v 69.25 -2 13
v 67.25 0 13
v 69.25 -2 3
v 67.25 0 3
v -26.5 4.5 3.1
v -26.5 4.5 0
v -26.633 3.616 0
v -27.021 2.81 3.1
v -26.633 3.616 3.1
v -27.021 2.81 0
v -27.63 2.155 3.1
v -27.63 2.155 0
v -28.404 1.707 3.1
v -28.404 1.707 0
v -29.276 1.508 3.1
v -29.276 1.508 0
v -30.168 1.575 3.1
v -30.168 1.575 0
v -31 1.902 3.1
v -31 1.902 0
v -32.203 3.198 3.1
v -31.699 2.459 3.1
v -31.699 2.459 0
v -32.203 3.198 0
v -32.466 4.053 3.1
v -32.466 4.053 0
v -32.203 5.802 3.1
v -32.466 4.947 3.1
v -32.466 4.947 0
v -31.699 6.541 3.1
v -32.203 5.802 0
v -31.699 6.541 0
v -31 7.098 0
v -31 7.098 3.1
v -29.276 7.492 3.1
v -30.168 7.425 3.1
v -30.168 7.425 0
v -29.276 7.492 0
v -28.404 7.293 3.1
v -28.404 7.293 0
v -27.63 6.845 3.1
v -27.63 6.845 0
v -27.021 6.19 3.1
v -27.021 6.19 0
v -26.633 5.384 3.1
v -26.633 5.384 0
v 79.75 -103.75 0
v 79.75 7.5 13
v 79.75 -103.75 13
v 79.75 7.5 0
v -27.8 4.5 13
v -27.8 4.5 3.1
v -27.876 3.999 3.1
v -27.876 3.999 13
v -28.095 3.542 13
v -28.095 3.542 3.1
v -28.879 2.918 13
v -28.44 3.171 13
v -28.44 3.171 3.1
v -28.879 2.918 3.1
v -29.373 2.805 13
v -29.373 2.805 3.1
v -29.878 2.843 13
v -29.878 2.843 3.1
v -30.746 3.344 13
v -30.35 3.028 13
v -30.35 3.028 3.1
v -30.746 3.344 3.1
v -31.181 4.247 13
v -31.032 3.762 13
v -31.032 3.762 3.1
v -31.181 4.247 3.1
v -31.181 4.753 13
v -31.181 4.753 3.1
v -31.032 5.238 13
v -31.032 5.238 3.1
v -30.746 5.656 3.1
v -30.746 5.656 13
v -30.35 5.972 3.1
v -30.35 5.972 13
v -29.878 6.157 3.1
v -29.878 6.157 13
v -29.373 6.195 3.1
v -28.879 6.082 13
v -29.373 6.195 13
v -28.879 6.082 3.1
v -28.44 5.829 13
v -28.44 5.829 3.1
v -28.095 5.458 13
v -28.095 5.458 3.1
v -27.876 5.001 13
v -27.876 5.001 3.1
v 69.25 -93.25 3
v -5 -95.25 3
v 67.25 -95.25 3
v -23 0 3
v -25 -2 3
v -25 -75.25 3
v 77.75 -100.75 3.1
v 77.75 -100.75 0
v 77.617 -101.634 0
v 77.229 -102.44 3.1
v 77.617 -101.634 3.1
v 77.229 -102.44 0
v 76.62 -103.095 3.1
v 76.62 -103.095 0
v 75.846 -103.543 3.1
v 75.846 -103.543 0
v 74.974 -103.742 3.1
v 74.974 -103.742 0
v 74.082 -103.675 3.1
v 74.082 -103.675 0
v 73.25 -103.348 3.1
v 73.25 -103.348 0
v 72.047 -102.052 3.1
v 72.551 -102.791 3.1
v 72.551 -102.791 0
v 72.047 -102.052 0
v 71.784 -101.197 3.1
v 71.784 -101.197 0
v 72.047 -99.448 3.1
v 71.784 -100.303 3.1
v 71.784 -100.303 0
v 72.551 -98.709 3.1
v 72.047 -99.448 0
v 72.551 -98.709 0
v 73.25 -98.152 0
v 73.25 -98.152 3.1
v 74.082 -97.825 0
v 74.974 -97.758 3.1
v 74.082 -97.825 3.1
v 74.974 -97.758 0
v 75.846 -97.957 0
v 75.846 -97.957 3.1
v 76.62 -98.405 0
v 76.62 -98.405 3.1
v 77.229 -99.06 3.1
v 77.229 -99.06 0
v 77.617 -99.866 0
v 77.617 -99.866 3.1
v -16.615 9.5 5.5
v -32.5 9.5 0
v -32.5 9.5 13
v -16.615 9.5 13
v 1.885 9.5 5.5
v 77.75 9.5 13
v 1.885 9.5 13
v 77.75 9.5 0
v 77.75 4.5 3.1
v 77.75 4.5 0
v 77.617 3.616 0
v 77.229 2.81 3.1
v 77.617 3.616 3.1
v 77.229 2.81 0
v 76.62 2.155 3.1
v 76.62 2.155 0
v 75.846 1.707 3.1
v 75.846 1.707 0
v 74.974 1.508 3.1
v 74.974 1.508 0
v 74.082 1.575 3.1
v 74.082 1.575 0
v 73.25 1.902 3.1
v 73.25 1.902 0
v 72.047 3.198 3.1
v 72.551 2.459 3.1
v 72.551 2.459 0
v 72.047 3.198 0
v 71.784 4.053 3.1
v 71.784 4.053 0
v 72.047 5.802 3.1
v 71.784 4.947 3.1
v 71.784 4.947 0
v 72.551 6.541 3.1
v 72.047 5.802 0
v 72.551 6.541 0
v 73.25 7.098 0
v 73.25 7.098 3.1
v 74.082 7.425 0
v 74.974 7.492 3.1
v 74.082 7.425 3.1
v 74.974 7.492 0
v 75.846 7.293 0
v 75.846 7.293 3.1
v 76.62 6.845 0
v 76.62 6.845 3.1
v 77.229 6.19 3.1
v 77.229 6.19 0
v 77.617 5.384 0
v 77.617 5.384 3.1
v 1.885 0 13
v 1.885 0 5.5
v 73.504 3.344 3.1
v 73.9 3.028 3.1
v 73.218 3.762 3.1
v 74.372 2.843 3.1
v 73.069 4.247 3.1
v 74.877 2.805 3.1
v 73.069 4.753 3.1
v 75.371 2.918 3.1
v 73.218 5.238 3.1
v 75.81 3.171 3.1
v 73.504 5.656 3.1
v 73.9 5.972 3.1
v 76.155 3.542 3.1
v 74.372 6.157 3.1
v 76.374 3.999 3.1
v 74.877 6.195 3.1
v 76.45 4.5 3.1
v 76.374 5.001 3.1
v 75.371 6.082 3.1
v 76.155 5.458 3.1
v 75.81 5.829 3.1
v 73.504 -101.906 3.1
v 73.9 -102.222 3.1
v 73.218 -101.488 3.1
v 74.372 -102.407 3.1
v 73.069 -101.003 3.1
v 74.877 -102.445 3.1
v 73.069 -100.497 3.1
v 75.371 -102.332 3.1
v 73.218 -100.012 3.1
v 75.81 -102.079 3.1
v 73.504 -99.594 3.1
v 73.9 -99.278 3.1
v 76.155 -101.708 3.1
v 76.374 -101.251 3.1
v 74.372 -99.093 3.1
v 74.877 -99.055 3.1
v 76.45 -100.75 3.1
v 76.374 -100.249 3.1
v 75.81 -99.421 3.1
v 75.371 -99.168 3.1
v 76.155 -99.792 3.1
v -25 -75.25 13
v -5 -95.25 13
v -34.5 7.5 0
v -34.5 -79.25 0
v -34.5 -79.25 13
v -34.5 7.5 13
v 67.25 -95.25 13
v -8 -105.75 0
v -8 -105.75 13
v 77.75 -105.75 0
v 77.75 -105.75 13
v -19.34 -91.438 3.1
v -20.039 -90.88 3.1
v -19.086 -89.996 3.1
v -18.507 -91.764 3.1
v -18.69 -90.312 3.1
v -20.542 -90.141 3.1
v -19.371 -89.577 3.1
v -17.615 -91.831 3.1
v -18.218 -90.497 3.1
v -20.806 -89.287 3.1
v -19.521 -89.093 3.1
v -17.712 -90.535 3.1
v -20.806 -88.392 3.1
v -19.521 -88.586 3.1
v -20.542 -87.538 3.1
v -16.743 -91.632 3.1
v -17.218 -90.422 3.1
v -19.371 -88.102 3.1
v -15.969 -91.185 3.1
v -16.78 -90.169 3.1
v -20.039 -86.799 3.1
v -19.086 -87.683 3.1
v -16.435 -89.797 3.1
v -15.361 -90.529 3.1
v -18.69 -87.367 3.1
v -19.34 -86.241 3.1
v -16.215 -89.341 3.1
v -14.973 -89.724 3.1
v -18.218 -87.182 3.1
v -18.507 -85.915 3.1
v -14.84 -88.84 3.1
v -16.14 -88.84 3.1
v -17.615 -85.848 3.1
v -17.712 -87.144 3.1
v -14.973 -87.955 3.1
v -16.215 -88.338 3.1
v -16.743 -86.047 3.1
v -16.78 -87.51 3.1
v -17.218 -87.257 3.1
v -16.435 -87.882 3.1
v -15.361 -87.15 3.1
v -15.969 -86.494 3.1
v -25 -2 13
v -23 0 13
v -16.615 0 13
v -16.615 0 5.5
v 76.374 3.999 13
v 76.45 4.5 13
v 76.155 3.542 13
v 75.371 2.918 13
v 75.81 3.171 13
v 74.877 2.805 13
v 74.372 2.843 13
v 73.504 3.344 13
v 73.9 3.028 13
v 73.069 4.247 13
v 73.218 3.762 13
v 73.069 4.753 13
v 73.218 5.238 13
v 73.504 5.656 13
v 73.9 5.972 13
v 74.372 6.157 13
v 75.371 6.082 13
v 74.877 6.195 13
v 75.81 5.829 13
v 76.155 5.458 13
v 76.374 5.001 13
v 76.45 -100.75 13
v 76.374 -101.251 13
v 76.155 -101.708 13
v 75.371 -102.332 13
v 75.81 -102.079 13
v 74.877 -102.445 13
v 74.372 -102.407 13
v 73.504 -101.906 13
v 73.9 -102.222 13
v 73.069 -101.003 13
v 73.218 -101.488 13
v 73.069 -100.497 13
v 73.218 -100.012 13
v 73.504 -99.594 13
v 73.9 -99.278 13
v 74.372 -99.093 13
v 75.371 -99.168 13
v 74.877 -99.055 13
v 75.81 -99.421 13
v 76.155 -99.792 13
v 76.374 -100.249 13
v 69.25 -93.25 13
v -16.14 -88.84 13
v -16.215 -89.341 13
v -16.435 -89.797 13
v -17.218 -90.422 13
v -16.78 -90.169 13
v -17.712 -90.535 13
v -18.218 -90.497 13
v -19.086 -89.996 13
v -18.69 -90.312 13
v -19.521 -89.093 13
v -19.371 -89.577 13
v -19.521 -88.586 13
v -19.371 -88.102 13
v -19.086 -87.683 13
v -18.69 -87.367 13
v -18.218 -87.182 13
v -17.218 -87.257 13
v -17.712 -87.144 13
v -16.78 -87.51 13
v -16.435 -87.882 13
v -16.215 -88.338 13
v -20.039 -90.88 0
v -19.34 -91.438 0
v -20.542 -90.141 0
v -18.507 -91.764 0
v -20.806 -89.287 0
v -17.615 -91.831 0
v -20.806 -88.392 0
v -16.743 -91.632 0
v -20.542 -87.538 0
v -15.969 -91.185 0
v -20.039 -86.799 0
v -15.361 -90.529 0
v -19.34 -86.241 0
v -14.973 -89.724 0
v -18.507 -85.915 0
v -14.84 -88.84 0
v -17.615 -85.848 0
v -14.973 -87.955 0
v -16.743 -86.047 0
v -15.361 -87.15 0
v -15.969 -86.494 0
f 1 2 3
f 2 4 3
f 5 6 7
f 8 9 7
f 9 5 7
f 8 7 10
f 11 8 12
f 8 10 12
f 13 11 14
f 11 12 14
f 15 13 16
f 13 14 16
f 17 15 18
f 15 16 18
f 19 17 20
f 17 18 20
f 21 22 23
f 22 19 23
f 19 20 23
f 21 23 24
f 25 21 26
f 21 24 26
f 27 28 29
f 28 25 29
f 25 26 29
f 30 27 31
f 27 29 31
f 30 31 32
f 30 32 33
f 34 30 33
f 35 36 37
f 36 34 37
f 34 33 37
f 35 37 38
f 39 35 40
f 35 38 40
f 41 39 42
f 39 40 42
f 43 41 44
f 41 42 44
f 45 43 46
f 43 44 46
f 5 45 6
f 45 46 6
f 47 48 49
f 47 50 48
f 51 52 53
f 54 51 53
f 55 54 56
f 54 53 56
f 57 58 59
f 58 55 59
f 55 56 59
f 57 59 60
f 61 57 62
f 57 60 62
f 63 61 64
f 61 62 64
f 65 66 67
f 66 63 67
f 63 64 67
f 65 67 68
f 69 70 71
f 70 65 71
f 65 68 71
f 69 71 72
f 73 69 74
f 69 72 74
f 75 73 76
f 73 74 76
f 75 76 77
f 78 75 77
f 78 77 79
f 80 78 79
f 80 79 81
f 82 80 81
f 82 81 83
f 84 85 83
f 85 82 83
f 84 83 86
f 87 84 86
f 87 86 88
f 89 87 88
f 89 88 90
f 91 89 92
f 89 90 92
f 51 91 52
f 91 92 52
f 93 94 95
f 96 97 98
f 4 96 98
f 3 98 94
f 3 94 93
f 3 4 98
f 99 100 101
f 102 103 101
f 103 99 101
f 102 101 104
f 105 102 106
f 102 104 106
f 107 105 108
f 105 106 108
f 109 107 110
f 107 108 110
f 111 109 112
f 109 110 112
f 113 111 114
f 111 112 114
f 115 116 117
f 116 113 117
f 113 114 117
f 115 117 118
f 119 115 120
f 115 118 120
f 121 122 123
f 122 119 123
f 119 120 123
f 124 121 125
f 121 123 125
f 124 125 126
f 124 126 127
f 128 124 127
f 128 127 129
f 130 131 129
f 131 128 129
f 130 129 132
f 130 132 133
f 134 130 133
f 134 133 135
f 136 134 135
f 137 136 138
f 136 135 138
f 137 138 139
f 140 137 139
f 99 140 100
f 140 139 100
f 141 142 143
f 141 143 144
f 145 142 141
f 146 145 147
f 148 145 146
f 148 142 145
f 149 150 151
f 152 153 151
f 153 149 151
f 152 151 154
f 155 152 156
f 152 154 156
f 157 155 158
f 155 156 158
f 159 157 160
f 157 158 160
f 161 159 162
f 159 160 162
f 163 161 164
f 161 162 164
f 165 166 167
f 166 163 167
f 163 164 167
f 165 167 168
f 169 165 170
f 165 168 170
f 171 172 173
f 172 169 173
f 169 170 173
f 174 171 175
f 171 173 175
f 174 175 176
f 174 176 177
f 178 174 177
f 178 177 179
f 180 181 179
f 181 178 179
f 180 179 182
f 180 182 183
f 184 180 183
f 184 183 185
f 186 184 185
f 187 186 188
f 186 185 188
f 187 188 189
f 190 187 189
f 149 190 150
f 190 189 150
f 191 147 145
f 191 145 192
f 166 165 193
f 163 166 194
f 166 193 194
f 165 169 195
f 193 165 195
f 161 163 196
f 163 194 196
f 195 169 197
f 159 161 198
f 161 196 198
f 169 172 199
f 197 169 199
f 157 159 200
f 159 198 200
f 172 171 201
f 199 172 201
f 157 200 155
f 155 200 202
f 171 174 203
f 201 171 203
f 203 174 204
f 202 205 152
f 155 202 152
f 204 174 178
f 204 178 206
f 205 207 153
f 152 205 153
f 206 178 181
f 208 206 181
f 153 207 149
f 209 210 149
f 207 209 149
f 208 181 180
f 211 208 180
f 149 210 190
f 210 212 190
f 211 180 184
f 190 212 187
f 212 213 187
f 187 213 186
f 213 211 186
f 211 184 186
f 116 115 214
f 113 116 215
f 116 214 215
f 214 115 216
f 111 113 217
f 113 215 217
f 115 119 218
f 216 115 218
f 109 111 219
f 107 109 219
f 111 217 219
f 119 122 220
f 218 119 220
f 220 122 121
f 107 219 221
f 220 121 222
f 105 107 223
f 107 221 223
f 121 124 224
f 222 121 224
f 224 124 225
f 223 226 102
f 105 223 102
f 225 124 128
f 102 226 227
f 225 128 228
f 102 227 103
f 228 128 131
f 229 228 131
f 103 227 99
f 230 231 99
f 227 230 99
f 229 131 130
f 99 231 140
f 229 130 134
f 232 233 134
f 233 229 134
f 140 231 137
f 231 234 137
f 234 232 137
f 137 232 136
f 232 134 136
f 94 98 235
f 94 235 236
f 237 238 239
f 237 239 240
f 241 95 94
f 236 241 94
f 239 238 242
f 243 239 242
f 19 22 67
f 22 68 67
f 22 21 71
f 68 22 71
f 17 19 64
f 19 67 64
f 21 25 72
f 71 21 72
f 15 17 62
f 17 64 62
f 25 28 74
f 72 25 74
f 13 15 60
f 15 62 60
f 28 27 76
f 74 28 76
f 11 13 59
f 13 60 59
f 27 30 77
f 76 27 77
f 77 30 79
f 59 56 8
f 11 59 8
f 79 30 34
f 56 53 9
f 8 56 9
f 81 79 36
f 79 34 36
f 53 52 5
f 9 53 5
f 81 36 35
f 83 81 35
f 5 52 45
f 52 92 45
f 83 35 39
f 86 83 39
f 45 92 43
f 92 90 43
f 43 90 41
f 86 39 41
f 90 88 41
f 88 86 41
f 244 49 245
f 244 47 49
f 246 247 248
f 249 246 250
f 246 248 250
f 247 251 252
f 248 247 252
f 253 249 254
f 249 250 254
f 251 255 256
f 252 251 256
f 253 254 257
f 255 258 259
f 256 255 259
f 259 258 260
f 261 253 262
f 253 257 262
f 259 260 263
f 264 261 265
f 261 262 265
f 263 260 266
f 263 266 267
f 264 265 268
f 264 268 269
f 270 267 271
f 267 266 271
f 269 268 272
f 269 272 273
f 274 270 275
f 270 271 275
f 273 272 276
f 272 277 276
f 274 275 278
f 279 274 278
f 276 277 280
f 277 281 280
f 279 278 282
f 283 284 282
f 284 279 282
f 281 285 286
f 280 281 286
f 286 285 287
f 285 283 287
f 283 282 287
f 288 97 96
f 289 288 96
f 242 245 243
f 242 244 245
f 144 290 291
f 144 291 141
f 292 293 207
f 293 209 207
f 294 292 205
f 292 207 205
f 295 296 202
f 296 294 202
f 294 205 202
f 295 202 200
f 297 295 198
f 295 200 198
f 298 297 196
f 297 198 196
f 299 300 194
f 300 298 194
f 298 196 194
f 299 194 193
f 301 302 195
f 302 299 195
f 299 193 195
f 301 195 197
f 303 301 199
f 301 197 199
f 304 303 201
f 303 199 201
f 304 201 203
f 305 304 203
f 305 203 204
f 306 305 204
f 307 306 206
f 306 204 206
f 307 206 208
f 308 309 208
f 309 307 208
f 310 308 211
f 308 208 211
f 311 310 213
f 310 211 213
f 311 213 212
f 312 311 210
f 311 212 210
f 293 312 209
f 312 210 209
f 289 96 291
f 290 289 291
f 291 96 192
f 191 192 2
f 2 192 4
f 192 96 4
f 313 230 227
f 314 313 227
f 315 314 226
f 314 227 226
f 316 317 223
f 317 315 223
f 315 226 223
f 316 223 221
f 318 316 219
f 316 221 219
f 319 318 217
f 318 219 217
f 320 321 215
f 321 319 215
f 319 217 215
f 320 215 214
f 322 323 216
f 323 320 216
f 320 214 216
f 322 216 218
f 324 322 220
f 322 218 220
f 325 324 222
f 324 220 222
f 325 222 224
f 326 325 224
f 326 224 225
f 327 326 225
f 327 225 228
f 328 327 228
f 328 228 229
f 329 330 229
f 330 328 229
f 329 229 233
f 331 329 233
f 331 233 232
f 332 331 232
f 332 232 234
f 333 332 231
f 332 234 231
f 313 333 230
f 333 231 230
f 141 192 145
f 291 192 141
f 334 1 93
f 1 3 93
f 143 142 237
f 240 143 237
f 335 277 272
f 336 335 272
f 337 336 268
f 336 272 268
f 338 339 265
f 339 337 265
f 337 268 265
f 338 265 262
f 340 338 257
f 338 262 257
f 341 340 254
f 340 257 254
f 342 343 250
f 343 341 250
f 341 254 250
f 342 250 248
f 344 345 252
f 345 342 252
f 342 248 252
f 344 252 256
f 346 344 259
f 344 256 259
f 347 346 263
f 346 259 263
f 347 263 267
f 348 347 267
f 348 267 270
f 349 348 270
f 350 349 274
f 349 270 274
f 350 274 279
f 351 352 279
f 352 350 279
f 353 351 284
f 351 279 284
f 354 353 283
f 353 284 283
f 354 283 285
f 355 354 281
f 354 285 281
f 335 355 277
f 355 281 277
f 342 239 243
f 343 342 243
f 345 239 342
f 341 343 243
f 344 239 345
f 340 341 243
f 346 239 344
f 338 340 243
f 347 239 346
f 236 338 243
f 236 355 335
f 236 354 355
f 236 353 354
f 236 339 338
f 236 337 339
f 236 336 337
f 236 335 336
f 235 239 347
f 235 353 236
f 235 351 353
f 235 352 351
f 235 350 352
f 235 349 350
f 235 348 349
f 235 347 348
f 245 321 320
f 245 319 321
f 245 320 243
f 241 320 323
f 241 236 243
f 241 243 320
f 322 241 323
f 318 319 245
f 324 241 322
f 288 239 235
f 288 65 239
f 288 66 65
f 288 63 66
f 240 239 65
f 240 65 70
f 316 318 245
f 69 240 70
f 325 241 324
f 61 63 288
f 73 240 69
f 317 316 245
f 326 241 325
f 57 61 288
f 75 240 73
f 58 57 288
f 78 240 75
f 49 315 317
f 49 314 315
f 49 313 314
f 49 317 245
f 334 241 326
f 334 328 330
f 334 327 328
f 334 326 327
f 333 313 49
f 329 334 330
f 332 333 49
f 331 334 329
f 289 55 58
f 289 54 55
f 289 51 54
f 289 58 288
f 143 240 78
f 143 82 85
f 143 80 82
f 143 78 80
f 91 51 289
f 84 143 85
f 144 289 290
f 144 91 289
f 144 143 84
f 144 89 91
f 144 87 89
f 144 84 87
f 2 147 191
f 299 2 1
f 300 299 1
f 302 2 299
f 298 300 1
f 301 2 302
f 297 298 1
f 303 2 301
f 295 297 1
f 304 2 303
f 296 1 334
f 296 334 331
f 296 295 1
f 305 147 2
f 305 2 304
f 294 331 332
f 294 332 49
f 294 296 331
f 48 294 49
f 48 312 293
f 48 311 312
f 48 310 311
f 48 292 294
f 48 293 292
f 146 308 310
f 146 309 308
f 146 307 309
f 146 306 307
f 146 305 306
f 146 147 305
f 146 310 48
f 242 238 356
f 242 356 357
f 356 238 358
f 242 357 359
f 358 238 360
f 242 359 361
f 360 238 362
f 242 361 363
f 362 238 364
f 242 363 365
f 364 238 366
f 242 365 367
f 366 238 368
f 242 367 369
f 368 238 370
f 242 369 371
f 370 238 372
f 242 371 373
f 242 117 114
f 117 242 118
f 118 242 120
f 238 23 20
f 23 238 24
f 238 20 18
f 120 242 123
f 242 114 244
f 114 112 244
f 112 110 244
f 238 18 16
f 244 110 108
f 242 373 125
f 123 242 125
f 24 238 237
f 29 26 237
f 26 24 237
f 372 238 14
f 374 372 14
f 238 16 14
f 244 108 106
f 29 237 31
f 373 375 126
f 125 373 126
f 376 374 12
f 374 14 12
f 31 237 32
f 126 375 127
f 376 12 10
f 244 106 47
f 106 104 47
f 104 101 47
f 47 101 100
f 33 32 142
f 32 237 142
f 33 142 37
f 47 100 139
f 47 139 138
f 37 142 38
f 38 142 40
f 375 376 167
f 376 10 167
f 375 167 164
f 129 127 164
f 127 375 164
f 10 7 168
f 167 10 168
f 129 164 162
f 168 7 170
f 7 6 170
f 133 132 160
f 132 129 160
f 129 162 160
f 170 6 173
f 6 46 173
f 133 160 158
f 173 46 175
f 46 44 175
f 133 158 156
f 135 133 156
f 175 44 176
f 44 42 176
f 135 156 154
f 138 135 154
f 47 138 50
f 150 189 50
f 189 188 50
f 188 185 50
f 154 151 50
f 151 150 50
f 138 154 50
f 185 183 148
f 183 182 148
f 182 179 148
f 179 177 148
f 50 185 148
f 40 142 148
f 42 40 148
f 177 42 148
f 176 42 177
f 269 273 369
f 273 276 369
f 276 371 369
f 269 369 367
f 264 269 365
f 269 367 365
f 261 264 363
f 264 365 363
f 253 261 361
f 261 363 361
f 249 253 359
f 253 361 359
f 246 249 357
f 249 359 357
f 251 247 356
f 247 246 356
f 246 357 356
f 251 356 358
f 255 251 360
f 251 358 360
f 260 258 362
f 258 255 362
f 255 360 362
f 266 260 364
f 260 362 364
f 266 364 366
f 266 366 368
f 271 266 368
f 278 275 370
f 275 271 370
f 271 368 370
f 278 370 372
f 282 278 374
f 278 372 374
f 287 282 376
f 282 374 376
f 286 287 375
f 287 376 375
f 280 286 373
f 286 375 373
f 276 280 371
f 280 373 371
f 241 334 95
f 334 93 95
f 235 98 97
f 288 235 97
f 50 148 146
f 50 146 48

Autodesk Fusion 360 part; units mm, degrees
sketch "Sketch1" plane through (0, 0, 0) normal (0, 0, 1) x (1, 0, 0) in component "RadPad"
  line L0 (-23, 0) -> (67.25, 0)
  line L1 (69.25, -2) -> (69.25, -93.25)
  line L2 (67.25, -95.25) -> (-5, -95.25)
  line L3 (-25, -75.25) -> (-25, -2)
  line L4 (-32.5, 9.5) -> (77.75, 9.5)
  line L5 (79.75, 7.5) -> (79.75, -103.75)
  line L6 (77.75, -105.75) -> (-8, -105.75)
  line L7 (-34.5, -79.25) -> (-34.5, 7.5)
  circle A0 centre (-17.8395, -88.8395) radius 1.7
  circle A1 centre (74.75, -100.75) radius 1.7
  circle A2 centre (74.75, 4.5) radius 1.7
  circle A3 centre (-29.5, 4.5) radius 1.7
  circle A4 centre (-29.5, 4.5) radius 3
  circle A5 centre (74.75, 4.5) radius 3
  circle A6 centre (74.75, -100.75) radius 3
  circle A7 centre (-17.8395, -88.8395) radius 3
  line L8 (-25, -75.25) -> (-5, -95.25)
  line L9 (-34.5, -79.25) -> (-8, -105.75)
  line L10 (-32.5, 9.5) -> (-34.5, 7.5)
  line L11 (-25, -2) -> (-23, 0)
  line L12 (67.25, 0) -> (69.25, -2)
  line L13 (69.25, -93.25) -> (67.25, -95.25)
  line L14 (79.75, -103.75) -> (77.75, -105.75)
  line L15 (77.75, 9.5) -> (79.75, 7.5)
  point P0 (-25, 0)
  point P1 (69.25, 0)
  point P2 (69.25, -95.25)
  point P3 (-25, -95.25)
  point P4 (-34.5, 9.5)
  point P5 (79.75, 9.5)
  point P6 (79.75, -105.75)
  point P7 (-34.5, -105.75)
  point P8 (75, -100)
  dimension "d1" = 94.25
  dimension "d2" = 95.25
  dimension "d3" = 114.25
  dimension "d4" = 115.25
  dimension "d5" = 9.5
  dimension "d6" = 9.5
  dimension "d7" = 3.4
  dimension "d8" = 3.4
  dimension "d9" = 3.4
  dimension "d10" = 3.4
  dimension "d11" = 5
  dimension "d12" = 5
  dimension "d15" = 5
  dimension "d16" = 5
  dimension "d17" = 5
  dimension "d18" = 5
  dimension "d19" = 6
  dimension "d20" = 6
  dimension "d21" = 6
  dimension "d22" = 6
  dimension "d23" = 20
  dimension "d24" = 20
  dimension "d25" = 26.5
  dimension "d26" = 26.5
  dimension "d27" = 5
  dimension "d28" = 2
  dimension "d29" = 2
  dimension "d30" = 2
  dimension "d31" = 2
  dimension "d32" = 2
  dimension "d33" = 2
  dimension "d34" = 2
  dimension "d35" = 2
  dimension "d36" = 2
  dimension "d37" = 2
  dimension "d38" = 2
  dimension "d39" = 2
extrude "Extrude1" add sketch "Sketch1" along normal blind 9.9 from surface at 3.1 contours A4 | A5 | A6 | A7 makes body 1 at (75.5625, 7.3879, 9.7) makes body 2 at (77.3099, -99.1857, 9.7) makes body 3 at (-26.5037, 4.3505, 9.7) makes body 4 at (-20.3993, -90.4038, 9.7) in component "RadPad"
extrude "Extrude2" add sketch "Sketch1" along normal blind 13 contours L4 L5 L6 L7 L9 L10 L14 L15 bodies 1 2 3 4 in component "RadPad"
extrude "Extrude3" add sketch "Sketch1" along normal blind 3 contours L0 L1 L2 L3 L8 L11 L12 L13 bodies 1 in component "RadPad"
sketch "Sketch2" plane through (0, 0, 13) normal (0, 0, 1) x (-1, 0, 0) in component "RadPad"
  circle A0 centre (-74.75, -4.5) radius 1.7
  circle A1 centre (17.8395, 88.8395) radius 1.7
  line L0 (5, 95.25) -> (25, 75.25)
  line L1 (25, 75.25) -> (25, 2)
  line L2 (25, 2) -> (23, 0)
  line L3 (23, 0) -> (-67.25, 0)
  line L4 (-67.25, 0) -> (-69.25, 2)
  line L5 (-69.25, 2) -> (-69.25, 93.25)
  line L6 (-69.25, 93.25) -> (-67.25, 95.25)
  line L7 (-67.25, 95.25) -> (5, 95.25)
  line L8 (32.5, -9.5) -> (34.5, -7.5)
  line L9 (34.5, -7.5) -> (34.5, 79.25)
  line L10 (34.5, 79.25) -> (8, 105.75)
  line L11 (8, 105.75) -> (-77.75, 105.75)
  line L12 (-77.75, 105.75) -> (-79.75, 103.75)
  line L13 (-79.75, 103.75) -> (-79.75, -7.5)
  line L14 (-79.75, -7.5) -> (-77.75, -9.5)
  line L15 (-77.75, -9.5) -> (32.5, -9.5)
  circle A2 centre (-74.75, 100.75) radius 1.7
  circle A3 centre (29.5, -4.5) radius 1.7
  line L16 (16.615, -9.5) -> (-1.885, -9.5)
  line L17 (-1.885, -9.5) -> (-1.885, 0)
  line L18 (-1.885, 0) -> (16.615, 0)
  line L19 (16.615, 0) -> (16.615, -9.5)
  line L20 (34.5, 79.25) -> (34.5, -7.5)
  point P0 (25, 0)
  dimension "d47" = 18.5
  dimension "d49" = 17.885
extrude "Extrude4" cut sketch "Sketch2" against normal blind 7.5 contours L3 L15 L16 L17 L18 L19 bodies 1 in component "RadPad"
component "RadPad" placed x (1, 0, 0) y (0, 1, 0) z (0, 0, 1) at (0, 0, 0)
equation "d24 = d23"
equation "d26 = d25"
equation "d29 = d28"
equation "d31 = d30"
equation "d33 = d32"
equation "d35 = d34"
equation "d37 = d36"
equation "d39 = d38"
equation "d49 = 12.135 mm + 5.75 mm"
